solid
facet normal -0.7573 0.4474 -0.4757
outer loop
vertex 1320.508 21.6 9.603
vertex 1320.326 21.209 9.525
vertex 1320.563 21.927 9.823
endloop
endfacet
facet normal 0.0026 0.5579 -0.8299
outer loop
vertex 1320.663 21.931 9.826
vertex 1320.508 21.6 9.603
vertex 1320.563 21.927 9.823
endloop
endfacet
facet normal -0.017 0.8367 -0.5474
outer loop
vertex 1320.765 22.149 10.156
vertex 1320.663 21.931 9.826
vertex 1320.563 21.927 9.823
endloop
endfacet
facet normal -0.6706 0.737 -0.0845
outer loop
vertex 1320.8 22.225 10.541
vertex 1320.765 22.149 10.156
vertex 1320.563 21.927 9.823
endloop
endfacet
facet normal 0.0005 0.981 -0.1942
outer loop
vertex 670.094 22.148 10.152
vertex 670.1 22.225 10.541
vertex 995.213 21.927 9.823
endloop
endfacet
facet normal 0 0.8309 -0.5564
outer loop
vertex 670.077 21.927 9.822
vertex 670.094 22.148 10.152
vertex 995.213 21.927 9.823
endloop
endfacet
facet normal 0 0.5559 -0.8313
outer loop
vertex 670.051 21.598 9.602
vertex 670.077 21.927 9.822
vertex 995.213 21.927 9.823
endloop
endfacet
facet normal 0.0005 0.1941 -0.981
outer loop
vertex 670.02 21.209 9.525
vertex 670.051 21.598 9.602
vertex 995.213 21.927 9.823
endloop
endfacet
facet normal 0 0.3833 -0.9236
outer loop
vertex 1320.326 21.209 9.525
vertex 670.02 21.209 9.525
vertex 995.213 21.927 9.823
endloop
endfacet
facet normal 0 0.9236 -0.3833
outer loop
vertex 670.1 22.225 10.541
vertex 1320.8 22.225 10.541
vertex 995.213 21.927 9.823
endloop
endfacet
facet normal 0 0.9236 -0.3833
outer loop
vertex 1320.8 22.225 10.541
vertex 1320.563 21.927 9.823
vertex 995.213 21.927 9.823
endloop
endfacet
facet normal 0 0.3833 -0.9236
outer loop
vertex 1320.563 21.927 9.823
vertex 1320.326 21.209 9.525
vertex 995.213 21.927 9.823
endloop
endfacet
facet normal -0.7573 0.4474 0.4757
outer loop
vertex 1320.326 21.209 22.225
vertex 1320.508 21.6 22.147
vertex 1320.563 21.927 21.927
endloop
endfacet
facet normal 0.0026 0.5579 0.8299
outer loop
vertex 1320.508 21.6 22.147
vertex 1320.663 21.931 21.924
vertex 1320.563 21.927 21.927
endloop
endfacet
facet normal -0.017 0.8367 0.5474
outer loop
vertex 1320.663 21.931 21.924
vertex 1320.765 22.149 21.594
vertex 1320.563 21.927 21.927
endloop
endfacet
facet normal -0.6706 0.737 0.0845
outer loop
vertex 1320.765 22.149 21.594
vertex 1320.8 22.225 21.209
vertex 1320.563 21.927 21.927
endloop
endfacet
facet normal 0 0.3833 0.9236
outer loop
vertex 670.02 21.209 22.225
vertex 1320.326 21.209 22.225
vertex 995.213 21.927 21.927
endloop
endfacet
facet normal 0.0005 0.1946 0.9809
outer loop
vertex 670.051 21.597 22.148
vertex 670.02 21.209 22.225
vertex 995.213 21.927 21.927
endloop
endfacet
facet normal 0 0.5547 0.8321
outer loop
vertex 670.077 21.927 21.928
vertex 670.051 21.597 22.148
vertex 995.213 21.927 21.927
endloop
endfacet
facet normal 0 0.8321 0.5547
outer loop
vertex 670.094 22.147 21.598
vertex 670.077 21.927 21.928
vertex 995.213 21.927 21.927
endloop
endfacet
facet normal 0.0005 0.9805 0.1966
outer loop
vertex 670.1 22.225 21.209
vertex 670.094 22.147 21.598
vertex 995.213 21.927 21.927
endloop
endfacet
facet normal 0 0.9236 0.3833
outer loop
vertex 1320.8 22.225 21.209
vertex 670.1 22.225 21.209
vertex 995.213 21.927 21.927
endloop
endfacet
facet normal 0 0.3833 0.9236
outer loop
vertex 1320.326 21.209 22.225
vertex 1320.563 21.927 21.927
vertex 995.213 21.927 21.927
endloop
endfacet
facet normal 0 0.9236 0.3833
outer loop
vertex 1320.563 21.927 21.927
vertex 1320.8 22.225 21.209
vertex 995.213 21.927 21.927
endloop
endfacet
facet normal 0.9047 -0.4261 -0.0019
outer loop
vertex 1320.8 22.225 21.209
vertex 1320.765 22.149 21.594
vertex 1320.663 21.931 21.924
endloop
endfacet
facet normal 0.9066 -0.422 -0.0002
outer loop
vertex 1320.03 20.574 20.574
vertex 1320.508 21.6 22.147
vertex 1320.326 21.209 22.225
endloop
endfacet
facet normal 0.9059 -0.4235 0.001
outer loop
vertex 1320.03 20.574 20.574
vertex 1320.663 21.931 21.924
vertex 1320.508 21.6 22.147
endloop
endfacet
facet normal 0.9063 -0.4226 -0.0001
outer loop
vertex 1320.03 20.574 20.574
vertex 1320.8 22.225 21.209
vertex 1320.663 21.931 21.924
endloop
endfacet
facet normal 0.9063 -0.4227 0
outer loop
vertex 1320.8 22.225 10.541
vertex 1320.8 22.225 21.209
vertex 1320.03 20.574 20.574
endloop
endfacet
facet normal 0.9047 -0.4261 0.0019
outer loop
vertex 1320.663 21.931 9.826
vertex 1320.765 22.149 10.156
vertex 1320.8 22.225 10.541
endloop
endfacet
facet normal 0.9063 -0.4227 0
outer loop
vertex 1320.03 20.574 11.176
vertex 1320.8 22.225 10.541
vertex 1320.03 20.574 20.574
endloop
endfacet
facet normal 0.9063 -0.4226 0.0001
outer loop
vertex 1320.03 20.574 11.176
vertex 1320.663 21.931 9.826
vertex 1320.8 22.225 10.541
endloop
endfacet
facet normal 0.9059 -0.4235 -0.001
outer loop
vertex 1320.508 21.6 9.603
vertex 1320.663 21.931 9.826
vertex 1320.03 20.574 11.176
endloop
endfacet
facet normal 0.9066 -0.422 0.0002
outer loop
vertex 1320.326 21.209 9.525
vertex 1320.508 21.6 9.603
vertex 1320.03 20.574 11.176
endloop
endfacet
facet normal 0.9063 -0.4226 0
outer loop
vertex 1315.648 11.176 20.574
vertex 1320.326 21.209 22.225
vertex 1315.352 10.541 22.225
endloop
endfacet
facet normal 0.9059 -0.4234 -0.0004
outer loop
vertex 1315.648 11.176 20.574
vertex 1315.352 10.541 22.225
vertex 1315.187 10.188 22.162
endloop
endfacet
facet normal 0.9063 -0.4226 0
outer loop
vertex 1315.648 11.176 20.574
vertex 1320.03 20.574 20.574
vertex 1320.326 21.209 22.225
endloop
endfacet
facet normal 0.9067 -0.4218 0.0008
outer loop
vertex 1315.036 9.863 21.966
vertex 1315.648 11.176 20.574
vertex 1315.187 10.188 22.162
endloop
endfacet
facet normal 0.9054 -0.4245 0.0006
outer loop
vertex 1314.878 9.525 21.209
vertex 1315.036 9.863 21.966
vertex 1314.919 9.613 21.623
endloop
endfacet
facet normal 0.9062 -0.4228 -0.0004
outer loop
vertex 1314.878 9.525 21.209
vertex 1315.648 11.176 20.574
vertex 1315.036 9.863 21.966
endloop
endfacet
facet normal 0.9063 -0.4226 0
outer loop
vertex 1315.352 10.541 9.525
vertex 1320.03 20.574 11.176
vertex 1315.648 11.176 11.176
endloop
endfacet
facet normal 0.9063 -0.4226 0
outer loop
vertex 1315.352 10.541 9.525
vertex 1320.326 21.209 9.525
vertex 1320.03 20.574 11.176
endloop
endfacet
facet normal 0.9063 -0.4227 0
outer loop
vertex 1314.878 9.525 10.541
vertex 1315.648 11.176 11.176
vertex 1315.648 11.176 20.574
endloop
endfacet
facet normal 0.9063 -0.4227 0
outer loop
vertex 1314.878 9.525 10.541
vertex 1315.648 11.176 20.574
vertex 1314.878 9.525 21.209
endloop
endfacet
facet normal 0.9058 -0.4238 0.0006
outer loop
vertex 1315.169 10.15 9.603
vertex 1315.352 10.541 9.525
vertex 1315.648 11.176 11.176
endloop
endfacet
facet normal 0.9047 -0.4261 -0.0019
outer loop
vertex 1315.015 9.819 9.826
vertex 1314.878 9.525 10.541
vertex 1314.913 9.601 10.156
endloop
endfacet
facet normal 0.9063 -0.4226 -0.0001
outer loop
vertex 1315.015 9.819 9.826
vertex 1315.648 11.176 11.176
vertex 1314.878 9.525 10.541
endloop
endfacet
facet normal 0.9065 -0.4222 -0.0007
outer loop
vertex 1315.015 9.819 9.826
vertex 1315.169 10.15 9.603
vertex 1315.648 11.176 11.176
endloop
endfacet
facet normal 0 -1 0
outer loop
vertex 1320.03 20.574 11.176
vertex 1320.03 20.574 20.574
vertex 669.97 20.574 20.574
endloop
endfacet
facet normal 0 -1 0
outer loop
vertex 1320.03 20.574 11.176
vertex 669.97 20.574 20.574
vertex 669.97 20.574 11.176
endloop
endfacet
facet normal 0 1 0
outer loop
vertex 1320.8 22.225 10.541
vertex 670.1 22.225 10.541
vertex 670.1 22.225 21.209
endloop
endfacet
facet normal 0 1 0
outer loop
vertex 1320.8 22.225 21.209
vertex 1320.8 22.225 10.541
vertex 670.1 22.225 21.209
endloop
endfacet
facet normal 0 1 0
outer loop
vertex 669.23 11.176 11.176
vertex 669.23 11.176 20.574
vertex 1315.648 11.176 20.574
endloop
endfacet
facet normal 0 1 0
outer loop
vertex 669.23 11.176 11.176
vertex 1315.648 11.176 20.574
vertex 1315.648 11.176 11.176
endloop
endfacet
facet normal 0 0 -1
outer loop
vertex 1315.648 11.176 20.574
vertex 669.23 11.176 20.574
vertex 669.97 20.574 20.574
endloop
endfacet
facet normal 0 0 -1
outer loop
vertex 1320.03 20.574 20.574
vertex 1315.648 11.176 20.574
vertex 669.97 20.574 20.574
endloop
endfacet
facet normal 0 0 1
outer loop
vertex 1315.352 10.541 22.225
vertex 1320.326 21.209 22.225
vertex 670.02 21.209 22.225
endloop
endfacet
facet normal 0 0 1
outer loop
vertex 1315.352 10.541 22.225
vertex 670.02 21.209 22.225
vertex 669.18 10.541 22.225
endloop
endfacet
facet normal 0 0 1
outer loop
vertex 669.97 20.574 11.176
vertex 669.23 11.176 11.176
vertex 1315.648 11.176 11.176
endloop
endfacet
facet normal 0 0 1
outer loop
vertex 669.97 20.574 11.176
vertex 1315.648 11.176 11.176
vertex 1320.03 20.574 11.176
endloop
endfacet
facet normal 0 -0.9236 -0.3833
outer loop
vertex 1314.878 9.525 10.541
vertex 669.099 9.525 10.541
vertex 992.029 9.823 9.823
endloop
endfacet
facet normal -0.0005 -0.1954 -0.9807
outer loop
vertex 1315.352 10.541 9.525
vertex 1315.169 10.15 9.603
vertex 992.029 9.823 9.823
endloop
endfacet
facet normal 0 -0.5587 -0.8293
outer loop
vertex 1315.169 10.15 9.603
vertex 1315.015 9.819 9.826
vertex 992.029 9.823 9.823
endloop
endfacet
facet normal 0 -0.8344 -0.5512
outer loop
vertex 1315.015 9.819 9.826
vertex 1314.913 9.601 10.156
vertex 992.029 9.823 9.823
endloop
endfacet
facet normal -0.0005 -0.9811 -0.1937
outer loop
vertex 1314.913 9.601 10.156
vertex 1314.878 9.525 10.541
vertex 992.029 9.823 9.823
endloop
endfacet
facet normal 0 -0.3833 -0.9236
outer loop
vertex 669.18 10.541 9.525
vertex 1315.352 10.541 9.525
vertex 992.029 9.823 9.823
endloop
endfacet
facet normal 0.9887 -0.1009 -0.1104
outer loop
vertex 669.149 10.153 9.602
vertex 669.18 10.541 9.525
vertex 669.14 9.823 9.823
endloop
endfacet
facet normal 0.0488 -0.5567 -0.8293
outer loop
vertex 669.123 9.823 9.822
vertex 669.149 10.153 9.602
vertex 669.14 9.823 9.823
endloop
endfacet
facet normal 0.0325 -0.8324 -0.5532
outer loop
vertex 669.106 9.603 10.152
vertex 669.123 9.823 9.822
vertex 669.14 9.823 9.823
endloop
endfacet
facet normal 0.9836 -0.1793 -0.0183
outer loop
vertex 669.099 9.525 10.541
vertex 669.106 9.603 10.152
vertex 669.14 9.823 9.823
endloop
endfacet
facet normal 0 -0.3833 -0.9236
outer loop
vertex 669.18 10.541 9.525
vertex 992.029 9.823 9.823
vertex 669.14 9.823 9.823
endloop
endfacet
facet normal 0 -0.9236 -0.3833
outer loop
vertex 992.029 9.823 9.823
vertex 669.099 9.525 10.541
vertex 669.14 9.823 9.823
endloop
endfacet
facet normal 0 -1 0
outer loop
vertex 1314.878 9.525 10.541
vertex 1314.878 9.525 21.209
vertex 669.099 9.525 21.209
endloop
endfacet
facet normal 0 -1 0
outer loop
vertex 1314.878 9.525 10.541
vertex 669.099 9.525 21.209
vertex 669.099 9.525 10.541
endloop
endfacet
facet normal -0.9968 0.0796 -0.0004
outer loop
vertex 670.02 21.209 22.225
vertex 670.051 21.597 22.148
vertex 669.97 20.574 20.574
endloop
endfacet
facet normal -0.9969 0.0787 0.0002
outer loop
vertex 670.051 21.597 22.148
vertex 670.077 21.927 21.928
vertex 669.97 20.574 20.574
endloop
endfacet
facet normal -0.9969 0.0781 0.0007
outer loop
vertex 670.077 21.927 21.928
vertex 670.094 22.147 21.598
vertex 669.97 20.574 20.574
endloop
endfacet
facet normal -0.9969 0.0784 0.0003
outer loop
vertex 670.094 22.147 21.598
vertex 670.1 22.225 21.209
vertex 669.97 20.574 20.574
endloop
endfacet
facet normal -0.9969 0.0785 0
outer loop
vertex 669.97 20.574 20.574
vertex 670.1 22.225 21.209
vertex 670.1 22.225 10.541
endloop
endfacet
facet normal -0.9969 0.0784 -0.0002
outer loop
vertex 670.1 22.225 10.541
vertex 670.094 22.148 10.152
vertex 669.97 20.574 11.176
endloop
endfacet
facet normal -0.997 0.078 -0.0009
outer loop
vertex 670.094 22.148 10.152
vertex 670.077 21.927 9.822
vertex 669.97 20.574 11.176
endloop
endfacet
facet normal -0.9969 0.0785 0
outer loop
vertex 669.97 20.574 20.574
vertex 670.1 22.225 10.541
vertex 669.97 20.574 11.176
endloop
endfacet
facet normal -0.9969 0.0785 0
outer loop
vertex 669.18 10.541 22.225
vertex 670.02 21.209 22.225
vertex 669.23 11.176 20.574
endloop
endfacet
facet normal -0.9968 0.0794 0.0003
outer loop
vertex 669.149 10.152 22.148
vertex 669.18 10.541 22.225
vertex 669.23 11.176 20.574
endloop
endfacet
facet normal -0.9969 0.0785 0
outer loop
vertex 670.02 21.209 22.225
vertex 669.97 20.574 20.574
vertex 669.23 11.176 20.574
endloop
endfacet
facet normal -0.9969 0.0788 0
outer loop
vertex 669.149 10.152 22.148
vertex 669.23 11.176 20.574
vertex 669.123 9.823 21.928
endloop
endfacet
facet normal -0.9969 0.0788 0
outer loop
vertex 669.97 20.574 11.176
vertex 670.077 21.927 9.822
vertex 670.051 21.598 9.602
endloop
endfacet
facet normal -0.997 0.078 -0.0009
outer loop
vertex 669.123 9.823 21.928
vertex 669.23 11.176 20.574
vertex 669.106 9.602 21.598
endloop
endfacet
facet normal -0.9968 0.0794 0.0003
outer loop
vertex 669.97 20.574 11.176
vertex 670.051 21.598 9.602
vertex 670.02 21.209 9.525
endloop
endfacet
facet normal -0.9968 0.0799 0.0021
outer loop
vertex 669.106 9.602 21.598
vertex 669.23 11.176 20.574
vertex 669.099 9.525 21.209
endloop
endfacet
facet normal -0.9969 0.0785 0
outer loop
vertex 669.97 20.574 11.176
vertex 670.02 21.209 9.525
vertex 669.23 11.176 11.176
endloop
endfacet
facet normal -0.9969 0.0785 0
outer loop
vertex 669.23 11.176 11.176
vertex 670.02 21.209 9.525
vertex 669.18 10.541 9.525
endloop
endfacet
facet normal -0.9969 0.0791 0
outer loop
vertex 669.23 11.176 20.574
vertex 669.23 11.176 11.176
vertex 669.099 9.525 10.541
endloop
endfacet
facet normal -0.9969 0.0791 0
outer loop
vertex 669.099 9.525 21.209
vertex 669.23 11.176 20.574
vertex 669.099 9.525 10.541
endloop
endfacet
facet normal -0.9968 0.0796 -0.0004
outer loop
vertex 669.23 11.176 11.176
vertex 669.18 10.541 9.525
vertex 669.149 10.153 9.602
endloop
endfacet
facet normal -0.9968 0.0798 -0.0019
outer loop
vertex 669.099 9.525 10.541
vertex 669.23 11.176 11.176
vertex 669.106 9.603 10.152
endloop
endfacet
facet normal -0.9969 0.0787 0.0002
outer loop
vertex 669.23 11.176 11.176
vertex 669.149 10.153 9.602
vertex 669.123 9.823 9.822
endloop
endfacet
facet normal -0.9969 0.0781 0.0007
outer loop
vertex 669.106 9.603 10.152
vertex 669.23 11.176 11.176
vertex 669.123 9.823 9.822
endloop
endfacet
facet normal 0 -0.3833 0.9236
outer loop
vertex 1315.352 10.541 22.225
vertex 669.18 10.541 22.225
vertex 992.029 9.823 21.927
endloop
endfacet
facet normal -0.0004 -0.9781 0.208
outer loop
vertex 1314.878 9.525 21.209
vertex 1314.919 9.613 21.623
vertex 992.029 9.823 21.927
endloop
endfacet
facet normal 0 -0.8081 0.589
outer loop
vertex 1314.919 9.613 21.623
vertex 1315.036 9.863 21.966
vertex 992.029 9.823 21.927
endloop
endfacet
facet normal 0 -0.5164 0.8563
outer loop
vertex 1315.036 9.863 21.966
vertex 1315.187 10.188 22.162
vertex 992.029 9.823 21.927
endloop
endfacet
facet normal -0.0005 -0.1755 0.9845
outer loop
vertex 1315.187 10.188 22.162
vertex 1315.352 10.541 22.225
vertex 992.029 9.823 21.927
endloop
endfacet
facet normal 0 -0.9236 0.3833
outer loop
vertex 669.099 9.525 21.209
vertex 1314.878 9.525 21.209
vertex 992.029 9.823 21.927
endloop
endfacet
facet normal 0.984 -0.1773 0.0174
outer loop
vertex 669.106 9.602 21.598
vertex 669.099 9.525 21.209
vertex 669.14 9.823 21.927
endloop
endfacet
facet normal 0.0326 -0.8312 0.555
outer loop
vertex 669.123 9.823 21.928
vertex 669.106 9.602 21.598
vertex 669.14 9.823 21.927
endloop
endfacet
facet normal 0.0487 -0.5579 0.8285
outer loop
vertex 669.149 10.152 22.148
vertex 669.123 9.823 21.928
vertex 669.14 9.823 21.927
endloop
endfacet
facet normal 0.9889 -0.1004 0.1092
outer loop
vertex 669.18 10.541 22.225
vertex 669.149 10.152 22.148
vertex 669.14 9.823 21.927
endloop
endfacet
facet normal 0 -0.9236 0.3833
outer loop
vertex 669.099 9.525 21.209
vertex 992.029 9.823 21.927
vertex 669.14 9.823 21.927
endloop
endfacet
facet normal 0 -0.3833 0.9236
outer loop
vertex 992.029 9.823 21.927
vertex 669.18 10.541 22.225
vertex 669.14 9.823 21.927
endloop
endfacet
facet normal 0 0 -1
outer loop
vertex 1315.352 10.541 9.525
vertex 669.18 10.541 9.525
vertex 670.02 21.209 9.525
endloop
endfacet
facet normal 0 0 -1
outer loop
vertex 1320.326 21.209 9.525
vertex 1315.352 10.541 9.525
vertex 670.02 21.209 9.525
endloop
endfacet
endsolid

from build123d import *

# Parameters (mm, degrees)
SKETCH1_W           = 23.495
SKETCH1_H           = 23.495
BOSS_EXTRUDE1_DEPTH = 1320.8
SCALE4_SCALE_X      = 1
SCALE4_SCALE_Y      = 0.4
SCALE4_SCALE_Z      = 0.4
CUT_EXTRUDE1_DEPTH  = 1322.04802369


with BuildPart() as part:
    # Sketch1 → Boss-Extrude1 (new body)
    with BuildSketch(Plane(origin=(0, 0, 0), x_dir=(0, 0, -1), z_dir=(1, 0, 0))):
        with BuildLine():
            Line((0, 2.54), (0, 29.21))
            ThreePointArc((0, 29.21), (-0.743948776, 31.006051224), (-2.54, 31.75))
            Line((-2.54, 31.75), (-29.21, 31.75))
            ThreePointArc((-29.21, 31.75), (-31.006051224, 31.006051224), (-31.75, 29.21))
            Line((-31.75, 29.21), (-31.75, 2.54))
            ThreePointArc((-31.75, 2.54), (-31.006051224, 0.743948776), (-29.21, 0))
            Line((-29.21, 0), (-2.54, 0))
            ThreePointArc((-2.54, 0), (-0.743948776, 0.743948776), (0, 2.54))
        make_face()
        with Locations((-15.875, 15.875)):
            Rectangle(SKETCH1_W, SKETCH1_H, mode=Mode.SUBTRACT)
    extrude(amount=BOSS_EXTRUDE1_DEPTH)


with BuildPart() as part_1:
    # Scale4: scaled about (660.4, 15.875, 15.875)
    add(part.part.scale((SCALE4_SCALE_X, SCALE4_SCALE_Y, SCALE4_SCALE_Z), about=(660.4, 15.875, 15.875)))

    # Sketch3 → Cut-Extrude1 (cut, through all)
    with BuildSketch(Plane(origin=(0, 0, 9.525), x_dir=(-1, 0, 0), z_dir=(0, 0, -1))):
        Polygon((-1320.8, 22.225), (-1314.877892741, 9.525), (-1320.8, 9.525), align=None)
        Polygon((-670.100451899, 22.225), (-669.099476758, 9.525), (-619.573747082, 9.525), (-619.573747082, 22.225), align=None)
    extrude(amount=-CUT_EXTRUDE1_DEPTH, mode=Mode.SUBTRACT)


with BuildPart() as cut_extrude1_kept_piece:
    # of the separate pieces the step leaves, the one the design keeps (cut_extrude1_pieces_kept)
    add(part_1.part.solids().sort_by_distance((670.020373888, 21.209, 9.525))[0])


solid = cut_extrude1_kept_piece.part
